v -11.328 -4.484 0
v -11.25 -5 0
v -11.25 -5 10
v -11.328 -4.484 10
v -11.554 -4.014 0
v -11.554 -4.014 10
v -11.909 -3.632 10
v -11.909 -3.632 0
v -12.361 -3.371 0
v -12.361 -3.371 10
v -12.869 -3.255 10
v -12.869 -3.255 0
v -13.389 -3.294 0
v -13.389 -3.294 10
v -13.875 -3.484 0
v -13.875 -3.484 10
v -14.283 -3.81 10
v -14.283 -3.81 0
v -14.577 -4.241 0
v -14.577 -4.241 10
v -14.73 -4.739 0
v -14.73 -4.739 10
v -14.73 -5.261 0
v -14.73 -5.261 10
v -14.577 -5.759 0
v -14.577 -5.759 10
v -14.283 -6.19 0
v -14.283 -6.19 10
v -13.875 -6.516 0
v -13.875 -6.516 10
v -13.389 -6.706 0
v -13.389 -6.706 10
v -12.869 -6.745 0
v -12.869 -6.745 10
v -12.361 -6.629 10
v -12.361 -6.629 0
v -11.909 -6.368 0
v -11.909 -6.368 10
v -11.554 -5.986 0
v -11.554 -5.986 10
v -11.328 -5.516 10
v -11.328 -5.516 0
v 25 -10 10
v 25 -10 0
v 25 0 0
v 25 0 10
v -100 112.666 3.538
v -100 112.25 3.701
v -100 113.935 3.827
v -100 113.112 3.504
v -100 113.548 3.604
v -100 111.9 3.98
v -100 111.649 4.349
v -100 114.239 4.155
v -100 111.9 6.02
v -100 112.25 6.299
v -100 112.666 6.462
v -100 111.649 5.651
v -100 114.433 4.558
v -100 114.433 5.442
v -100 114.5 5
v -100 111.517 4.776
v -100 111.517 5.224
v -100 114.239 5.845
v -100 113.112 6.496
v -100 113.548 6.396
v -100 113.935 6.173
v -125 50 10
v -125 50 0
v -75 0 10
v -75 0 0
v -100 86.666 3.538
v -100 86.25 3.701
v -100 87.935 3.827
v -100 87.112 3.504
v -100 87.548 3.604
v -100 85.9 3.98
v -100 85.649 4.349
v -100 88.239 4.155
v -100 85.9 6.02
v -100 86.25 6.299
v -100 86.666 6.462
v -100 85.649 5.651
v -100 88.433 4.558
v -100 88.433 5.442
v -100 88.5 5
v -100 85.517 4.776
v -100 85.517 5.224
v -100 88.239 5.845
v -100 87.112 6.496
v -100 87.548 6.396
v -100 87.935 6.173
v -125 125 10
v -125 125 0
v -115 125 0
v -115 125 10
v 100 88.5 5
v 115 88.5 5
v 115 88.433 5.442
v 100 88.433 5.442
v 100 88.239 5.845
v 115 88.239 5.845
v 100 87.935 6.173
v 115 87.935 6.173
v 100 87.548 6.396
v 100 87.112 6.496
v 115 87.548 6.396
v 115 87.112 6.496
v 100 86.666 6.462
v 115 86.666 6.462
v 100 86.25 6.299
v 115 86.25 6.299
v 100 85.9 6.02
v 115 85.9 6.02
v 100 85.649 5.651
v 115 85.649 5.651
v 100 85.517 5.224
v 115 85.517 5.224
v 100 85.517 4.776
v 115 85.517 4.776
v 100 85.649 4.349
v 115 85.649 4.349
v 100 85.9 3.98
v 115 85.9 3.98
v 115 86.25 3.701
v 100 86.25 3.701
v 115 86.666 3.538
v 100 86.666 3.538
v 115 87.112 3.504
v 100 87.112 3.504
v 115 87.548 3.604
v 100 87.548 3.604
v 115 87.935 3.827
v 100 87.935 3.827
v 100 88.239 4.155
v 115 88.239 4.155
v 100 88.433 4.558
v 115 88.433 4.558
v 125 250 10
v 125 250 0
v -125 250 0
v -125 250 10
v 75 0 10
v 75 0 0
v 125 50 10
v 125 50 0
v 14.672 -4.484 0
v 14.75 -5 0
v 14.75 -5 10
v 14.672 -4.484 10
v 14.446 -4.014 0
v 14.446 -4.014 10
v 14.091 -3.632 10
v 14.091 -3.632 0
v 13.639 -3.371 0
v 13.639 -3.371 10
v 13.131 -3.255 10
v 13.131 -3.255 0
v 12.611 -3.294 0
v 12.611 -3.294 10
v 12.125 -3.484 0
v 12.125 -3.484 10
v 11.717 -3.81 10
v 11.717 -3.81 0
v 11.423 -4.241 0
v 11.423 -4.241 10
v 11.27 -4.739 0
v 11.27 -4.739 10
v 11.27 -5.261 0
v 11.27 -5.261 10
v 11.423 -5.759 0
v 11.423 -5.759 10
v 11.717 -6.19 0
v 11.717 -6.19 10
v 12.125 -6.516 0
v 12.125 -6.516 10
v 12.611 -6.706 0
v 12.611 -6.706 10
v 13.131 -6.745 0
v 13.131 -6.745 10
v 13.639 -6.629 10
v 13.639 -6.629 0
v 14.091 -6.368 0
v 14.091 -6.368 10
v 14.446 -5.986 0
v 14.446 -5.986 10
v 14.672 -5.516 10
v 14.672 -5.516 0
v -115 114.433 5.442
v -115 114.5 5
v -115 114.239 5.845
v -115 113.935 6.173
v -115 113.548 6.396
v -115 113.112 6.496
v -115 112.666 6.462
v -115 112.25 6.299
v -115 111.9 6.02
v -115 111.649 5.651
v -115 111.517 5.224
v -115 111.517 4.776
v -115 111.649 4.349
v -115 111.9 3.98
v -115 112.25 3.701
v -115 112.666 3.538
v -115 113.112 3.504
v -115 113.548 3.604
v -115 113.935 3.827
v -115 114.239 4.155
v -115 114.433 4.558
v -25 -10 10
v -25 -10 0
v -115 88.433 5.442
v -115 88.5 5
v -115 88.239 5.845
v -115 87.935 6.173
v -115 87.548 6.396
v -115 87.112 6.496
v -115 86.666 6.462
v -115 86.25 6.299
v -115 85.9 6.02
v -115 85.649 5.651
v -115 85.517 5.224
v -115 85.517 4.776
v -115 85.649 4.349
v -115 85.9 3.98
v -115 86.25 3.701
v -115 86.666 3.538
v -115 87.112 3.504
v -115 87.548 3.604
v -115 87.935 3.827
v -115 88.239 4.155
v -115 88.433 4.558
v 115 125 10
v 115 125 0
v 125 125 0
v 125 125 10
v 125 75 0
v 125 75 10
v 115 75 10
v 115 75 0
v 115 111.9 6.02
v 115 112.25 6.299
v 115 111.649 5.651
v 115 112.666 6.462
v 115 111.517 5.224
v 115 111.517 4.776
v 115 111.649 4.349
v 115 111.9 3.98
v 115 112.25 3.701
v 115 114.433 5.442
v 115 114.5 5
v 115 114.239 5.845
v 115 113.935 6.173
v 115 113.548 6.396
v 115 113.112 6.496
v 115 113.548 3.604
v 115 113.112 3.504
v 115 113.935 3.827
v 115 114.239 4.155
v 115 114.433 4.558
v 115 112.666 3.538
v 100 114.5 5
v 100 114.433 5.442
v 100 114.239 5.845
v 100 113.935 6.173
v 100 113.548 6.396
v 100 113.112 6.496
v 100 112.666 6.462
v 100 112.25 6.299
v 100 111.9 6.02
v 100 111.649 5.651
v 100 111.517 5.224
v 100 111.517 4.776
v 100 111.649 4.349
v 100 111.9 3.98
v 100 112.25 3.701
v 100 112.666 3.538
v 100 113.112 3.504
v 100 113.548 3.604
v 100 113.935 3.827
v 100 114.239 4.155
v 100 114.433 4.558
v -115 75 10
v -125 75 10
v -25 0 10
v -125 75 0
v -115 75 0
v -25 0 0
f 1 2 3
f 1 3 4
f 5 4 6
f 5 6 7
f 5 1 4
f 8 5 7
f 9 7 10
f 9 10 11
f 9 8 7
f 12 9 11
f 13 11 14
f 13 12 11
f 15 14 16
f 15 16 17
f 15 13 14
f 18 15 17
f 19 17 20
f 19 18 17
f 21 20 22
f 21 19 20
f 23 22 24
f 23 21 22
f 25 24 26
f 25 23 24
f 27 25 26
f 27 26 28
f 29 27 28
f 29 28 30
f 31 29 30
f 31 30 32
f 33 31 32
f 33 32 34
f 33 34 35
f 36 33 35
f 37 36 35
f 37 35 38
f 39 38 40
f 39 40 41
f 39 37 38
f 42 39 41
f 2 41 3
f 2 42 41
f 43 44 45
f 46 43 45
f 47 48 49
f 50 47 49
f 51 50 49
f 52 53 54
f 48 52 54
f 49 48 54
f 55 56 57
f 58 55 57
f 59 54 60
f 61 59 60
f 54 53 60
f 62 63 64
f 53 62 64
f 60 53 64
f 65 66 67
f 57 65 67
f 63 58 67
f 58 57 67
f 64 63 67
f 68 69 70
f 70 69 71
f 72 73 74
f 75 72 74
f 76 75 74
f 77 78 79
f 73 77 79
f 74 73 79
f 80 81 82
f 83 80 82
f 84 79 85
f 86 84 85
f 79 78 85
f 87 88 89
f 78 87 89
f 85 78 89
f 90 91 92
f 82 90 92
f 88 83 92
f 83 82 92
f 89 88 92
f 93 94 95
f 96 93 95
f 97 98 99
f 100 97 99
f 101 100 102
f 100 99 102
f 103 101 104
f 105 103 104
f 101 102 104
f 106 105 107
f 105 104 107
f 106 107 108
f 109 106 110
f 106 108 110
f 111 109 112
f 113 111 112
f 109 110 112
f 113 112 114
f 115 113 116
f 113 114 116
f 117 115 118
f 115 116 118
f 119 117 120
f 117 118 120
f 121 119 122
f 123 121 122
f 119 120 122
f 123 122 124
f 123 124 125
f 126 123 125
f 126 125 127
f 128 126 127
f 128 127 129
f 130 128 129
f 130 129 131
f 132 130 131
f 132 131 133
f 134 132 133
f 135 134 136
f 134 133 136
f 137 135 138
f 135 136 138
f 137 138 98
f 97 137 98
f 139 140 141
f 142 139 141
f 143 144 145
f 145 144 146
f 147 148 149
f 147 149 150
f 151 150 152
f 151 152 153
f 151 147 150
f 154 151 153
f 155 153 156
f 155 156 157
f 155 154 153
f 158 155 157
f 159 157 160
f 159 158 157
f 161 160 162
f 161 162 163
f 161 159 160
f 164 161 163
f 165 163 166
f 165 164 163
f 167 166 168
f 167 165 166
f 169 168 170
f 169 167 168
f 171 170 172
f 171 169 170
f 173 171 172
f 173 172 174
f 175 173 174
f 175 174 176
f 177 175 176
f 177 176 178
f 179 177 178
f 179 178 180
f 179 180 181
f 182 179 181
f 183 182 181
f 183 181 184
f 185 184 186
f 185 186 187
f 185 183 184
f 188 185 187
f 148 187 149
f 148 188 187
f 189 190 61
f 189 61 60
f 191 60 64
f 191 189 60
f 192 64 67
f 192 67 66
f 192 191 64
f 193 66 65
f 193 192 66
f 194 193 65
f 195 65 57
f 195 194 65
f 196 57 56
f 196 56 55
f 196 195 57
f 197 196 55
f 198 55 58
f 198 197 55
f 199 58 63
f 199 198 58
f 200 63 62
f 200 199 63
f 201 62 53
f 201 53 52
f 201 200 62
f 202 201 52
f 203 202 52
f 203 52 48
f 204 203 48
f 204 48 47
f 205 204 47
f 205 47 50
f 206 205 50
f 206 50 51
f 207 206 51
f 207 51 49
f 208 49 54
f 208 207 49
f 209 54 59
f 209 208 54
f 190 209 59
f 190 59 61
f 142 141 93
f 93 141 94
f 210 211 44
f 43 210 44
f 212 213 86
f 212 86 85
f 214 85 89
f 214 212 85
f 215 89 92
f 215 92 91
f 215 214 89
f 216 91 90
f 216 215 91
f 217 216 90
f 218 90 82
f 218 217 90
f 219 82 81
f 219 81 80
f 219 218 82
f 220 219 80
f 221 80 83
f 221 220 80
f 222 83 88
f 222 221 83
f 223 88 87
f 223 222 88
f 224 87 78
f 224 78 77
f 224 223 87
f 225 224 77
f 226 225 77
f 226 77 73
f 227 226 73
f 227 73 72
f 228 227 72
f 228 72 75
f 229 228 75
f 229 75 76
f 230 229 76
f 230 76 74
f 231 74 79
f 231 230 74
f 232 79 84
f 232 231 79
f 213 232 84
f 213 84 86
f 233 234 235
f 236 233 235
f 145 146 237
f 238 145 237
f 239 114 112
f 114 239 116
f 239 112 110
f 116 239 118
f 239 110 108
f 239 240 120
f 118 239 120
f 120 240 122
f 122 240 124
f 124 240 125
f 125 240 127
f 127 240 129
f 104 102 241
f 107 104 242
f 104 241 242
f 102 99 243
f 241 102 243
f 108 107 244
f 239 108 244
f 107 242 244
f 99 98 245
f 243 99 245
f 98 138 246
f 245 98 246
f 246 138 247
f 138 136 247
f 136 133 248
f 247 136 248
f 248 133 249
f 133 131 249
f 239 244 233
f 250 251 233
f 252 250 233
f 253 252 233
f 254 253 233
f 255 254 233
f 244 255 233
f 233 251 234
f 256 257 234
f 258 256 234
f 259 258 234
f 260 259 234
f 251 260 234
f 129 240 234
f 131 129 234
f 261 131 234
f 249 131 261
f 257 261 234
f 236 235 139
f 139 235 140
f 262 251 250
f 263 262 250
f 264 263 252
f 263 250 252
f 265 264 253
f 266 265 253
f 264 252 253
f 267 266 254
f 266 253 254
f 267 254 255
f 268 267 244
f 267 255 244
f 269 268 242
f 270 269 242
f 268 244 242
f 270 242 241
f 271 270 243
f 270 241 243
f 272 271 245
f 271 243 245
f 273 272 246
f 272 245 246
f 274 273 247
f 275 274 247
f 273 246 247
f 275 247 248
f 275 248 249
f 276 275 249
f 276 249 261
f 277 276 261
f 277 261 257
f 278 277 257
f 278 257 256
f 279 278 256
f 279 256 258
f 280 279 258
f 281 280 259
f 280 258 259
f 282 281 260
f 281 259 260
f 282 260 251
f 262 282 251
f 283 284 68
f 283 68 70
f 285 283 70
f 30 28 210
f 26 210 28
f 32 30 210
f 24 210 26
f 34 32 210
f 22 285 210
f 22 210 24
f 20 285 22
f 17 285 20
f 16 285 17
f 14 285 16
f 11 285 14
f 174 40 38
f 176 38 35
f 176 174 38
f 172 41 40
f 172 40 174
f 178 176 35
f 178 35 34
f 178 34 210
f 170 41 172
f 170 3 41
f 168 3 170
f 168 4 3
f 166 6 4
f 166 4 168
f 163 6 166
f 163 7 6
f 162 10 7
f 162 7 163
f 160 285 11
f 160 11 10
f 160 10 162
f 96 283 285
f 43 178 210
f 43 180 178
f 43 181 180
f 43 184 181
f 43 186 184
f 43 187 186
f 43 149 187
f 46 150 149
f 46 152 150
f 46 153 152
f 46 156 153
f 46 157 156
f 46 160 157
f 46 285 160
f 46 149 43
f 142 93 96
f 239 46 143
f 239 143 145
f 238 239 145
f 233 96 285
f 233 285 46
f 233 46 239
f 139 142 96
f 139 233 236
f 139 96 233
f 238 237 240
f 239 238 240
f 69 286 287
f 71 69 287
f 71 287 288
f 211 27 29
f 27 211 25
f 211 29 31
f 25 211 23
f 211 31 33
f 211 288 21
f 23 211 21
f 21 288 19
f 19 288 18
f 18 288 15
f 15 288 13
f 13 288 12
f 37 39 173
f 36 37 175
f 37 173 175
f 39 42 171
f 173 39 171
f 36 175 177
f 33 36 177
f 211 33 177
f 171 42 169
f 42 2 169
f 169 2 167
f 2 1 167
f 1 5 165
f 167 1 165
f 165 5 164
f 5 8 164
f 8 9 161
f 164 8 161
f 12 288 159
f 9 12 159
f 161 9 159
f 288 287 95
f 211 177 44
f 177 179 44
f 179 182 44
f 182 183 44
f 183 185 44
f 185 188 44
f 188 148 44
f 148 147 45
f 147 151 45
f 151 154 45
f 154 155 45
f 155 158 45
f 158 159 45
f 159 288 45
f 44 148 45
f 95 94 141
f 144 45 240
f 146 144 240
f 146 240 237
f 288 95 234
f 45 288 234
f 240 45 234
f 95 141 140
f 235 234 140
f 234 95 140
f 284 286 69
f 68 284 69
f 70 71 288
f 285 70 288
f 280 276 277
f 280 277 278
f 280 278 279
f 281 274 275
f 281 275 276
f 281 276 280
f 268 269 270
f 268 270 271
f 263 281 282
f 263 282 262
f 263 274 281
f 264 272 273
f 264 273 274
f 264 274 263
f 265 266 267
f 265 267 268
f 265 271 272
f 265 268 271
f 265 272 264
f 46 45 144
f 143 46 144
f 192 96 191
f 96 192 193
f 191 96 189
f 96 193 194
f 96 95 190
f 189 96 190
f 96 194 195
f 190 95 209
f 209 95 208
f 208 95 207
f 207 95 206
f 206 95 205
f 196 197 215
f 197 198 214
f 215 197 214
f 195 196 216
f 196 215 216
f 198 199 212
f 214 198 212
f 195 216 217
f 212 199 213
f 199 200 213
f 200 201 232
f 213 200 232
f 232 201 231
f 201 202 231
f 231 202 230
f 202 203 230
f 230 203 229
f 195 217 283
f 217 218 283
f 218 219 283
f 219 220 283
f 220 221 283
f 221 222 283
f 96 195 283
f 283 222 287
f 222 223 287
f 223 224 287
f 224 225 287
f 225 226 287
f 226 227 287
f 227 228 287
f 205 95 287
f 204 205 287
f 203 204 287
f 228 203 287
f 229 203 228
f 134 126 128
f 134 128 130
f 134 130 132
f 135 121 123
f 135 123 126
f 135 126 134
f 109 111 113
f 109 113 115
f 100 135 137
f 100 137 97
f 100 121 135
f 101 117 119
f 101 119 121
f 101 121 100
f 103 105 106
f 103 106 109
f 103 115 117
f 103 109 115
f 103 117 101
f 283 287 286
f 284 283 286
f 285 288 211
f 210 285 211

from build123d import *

# Parameters (mm, degrees)
SKETCH1_R           = 1.75
BOSS_EXTRUDE1_DEPTH = 10
SKETCH2_R           = 1.5
CUT_EXTRUDE1_DEPTH  = 15


with BuildPart() as part:
    # Sketch1 → Boss-Extrude1 (new body)
    with BuildSketch(Plane.XY):
        Polygon((-125, 75), (-125, 50), (-75, 0), (-25, 0), (-25, -10), (25, -10), (25, 0), (75, 0), (125, 50), (125, 75), (115, 75), (115, 125), (125, 125), (125, 250), (-125, 250), (-125, 125), (-115, 125), (-115, 75), align=None)
        with Locations((-13, -5)):
            Circle(SKETCH1_R, mode=Mode.SUBTRACT)
        with Locations((13, -5)):
            Circle(SKETCH1_R, mode=Mode.SUBTRACT)
    extrude(amount=BOSS_EXTRUDE1_DEPTH)

    # Sketch2 → Cut-Extrude1 (cut)
    with BuildSketch(Plane(origin=(115, 0, 0), x_dir=(0, 0, -1), z_dir=(1, 0, 0))):
        with Locations(Location((-5, 113, 0), (0, 0, 90))):
            Circle(SKETCH2_R)
        with Locations(Location((-5, 87, 0), (0, 0, 90))):
            Circle(SKETCH2_R)
    cut_extrude1 = extrude(amount=-CUT_EXTRUDE1_DEPTH, mode=Mode.SUBTRACT)

    # Mirror1: Cut-Extrude1 across plane
    add(cut_extrude1.mirror(Plane(origin=(0, 0, 0), x_dir=(0, 0, 1), z_dir=(1, 0, 0))), mode=Mode.SUBTRACT)


solid = part.part
